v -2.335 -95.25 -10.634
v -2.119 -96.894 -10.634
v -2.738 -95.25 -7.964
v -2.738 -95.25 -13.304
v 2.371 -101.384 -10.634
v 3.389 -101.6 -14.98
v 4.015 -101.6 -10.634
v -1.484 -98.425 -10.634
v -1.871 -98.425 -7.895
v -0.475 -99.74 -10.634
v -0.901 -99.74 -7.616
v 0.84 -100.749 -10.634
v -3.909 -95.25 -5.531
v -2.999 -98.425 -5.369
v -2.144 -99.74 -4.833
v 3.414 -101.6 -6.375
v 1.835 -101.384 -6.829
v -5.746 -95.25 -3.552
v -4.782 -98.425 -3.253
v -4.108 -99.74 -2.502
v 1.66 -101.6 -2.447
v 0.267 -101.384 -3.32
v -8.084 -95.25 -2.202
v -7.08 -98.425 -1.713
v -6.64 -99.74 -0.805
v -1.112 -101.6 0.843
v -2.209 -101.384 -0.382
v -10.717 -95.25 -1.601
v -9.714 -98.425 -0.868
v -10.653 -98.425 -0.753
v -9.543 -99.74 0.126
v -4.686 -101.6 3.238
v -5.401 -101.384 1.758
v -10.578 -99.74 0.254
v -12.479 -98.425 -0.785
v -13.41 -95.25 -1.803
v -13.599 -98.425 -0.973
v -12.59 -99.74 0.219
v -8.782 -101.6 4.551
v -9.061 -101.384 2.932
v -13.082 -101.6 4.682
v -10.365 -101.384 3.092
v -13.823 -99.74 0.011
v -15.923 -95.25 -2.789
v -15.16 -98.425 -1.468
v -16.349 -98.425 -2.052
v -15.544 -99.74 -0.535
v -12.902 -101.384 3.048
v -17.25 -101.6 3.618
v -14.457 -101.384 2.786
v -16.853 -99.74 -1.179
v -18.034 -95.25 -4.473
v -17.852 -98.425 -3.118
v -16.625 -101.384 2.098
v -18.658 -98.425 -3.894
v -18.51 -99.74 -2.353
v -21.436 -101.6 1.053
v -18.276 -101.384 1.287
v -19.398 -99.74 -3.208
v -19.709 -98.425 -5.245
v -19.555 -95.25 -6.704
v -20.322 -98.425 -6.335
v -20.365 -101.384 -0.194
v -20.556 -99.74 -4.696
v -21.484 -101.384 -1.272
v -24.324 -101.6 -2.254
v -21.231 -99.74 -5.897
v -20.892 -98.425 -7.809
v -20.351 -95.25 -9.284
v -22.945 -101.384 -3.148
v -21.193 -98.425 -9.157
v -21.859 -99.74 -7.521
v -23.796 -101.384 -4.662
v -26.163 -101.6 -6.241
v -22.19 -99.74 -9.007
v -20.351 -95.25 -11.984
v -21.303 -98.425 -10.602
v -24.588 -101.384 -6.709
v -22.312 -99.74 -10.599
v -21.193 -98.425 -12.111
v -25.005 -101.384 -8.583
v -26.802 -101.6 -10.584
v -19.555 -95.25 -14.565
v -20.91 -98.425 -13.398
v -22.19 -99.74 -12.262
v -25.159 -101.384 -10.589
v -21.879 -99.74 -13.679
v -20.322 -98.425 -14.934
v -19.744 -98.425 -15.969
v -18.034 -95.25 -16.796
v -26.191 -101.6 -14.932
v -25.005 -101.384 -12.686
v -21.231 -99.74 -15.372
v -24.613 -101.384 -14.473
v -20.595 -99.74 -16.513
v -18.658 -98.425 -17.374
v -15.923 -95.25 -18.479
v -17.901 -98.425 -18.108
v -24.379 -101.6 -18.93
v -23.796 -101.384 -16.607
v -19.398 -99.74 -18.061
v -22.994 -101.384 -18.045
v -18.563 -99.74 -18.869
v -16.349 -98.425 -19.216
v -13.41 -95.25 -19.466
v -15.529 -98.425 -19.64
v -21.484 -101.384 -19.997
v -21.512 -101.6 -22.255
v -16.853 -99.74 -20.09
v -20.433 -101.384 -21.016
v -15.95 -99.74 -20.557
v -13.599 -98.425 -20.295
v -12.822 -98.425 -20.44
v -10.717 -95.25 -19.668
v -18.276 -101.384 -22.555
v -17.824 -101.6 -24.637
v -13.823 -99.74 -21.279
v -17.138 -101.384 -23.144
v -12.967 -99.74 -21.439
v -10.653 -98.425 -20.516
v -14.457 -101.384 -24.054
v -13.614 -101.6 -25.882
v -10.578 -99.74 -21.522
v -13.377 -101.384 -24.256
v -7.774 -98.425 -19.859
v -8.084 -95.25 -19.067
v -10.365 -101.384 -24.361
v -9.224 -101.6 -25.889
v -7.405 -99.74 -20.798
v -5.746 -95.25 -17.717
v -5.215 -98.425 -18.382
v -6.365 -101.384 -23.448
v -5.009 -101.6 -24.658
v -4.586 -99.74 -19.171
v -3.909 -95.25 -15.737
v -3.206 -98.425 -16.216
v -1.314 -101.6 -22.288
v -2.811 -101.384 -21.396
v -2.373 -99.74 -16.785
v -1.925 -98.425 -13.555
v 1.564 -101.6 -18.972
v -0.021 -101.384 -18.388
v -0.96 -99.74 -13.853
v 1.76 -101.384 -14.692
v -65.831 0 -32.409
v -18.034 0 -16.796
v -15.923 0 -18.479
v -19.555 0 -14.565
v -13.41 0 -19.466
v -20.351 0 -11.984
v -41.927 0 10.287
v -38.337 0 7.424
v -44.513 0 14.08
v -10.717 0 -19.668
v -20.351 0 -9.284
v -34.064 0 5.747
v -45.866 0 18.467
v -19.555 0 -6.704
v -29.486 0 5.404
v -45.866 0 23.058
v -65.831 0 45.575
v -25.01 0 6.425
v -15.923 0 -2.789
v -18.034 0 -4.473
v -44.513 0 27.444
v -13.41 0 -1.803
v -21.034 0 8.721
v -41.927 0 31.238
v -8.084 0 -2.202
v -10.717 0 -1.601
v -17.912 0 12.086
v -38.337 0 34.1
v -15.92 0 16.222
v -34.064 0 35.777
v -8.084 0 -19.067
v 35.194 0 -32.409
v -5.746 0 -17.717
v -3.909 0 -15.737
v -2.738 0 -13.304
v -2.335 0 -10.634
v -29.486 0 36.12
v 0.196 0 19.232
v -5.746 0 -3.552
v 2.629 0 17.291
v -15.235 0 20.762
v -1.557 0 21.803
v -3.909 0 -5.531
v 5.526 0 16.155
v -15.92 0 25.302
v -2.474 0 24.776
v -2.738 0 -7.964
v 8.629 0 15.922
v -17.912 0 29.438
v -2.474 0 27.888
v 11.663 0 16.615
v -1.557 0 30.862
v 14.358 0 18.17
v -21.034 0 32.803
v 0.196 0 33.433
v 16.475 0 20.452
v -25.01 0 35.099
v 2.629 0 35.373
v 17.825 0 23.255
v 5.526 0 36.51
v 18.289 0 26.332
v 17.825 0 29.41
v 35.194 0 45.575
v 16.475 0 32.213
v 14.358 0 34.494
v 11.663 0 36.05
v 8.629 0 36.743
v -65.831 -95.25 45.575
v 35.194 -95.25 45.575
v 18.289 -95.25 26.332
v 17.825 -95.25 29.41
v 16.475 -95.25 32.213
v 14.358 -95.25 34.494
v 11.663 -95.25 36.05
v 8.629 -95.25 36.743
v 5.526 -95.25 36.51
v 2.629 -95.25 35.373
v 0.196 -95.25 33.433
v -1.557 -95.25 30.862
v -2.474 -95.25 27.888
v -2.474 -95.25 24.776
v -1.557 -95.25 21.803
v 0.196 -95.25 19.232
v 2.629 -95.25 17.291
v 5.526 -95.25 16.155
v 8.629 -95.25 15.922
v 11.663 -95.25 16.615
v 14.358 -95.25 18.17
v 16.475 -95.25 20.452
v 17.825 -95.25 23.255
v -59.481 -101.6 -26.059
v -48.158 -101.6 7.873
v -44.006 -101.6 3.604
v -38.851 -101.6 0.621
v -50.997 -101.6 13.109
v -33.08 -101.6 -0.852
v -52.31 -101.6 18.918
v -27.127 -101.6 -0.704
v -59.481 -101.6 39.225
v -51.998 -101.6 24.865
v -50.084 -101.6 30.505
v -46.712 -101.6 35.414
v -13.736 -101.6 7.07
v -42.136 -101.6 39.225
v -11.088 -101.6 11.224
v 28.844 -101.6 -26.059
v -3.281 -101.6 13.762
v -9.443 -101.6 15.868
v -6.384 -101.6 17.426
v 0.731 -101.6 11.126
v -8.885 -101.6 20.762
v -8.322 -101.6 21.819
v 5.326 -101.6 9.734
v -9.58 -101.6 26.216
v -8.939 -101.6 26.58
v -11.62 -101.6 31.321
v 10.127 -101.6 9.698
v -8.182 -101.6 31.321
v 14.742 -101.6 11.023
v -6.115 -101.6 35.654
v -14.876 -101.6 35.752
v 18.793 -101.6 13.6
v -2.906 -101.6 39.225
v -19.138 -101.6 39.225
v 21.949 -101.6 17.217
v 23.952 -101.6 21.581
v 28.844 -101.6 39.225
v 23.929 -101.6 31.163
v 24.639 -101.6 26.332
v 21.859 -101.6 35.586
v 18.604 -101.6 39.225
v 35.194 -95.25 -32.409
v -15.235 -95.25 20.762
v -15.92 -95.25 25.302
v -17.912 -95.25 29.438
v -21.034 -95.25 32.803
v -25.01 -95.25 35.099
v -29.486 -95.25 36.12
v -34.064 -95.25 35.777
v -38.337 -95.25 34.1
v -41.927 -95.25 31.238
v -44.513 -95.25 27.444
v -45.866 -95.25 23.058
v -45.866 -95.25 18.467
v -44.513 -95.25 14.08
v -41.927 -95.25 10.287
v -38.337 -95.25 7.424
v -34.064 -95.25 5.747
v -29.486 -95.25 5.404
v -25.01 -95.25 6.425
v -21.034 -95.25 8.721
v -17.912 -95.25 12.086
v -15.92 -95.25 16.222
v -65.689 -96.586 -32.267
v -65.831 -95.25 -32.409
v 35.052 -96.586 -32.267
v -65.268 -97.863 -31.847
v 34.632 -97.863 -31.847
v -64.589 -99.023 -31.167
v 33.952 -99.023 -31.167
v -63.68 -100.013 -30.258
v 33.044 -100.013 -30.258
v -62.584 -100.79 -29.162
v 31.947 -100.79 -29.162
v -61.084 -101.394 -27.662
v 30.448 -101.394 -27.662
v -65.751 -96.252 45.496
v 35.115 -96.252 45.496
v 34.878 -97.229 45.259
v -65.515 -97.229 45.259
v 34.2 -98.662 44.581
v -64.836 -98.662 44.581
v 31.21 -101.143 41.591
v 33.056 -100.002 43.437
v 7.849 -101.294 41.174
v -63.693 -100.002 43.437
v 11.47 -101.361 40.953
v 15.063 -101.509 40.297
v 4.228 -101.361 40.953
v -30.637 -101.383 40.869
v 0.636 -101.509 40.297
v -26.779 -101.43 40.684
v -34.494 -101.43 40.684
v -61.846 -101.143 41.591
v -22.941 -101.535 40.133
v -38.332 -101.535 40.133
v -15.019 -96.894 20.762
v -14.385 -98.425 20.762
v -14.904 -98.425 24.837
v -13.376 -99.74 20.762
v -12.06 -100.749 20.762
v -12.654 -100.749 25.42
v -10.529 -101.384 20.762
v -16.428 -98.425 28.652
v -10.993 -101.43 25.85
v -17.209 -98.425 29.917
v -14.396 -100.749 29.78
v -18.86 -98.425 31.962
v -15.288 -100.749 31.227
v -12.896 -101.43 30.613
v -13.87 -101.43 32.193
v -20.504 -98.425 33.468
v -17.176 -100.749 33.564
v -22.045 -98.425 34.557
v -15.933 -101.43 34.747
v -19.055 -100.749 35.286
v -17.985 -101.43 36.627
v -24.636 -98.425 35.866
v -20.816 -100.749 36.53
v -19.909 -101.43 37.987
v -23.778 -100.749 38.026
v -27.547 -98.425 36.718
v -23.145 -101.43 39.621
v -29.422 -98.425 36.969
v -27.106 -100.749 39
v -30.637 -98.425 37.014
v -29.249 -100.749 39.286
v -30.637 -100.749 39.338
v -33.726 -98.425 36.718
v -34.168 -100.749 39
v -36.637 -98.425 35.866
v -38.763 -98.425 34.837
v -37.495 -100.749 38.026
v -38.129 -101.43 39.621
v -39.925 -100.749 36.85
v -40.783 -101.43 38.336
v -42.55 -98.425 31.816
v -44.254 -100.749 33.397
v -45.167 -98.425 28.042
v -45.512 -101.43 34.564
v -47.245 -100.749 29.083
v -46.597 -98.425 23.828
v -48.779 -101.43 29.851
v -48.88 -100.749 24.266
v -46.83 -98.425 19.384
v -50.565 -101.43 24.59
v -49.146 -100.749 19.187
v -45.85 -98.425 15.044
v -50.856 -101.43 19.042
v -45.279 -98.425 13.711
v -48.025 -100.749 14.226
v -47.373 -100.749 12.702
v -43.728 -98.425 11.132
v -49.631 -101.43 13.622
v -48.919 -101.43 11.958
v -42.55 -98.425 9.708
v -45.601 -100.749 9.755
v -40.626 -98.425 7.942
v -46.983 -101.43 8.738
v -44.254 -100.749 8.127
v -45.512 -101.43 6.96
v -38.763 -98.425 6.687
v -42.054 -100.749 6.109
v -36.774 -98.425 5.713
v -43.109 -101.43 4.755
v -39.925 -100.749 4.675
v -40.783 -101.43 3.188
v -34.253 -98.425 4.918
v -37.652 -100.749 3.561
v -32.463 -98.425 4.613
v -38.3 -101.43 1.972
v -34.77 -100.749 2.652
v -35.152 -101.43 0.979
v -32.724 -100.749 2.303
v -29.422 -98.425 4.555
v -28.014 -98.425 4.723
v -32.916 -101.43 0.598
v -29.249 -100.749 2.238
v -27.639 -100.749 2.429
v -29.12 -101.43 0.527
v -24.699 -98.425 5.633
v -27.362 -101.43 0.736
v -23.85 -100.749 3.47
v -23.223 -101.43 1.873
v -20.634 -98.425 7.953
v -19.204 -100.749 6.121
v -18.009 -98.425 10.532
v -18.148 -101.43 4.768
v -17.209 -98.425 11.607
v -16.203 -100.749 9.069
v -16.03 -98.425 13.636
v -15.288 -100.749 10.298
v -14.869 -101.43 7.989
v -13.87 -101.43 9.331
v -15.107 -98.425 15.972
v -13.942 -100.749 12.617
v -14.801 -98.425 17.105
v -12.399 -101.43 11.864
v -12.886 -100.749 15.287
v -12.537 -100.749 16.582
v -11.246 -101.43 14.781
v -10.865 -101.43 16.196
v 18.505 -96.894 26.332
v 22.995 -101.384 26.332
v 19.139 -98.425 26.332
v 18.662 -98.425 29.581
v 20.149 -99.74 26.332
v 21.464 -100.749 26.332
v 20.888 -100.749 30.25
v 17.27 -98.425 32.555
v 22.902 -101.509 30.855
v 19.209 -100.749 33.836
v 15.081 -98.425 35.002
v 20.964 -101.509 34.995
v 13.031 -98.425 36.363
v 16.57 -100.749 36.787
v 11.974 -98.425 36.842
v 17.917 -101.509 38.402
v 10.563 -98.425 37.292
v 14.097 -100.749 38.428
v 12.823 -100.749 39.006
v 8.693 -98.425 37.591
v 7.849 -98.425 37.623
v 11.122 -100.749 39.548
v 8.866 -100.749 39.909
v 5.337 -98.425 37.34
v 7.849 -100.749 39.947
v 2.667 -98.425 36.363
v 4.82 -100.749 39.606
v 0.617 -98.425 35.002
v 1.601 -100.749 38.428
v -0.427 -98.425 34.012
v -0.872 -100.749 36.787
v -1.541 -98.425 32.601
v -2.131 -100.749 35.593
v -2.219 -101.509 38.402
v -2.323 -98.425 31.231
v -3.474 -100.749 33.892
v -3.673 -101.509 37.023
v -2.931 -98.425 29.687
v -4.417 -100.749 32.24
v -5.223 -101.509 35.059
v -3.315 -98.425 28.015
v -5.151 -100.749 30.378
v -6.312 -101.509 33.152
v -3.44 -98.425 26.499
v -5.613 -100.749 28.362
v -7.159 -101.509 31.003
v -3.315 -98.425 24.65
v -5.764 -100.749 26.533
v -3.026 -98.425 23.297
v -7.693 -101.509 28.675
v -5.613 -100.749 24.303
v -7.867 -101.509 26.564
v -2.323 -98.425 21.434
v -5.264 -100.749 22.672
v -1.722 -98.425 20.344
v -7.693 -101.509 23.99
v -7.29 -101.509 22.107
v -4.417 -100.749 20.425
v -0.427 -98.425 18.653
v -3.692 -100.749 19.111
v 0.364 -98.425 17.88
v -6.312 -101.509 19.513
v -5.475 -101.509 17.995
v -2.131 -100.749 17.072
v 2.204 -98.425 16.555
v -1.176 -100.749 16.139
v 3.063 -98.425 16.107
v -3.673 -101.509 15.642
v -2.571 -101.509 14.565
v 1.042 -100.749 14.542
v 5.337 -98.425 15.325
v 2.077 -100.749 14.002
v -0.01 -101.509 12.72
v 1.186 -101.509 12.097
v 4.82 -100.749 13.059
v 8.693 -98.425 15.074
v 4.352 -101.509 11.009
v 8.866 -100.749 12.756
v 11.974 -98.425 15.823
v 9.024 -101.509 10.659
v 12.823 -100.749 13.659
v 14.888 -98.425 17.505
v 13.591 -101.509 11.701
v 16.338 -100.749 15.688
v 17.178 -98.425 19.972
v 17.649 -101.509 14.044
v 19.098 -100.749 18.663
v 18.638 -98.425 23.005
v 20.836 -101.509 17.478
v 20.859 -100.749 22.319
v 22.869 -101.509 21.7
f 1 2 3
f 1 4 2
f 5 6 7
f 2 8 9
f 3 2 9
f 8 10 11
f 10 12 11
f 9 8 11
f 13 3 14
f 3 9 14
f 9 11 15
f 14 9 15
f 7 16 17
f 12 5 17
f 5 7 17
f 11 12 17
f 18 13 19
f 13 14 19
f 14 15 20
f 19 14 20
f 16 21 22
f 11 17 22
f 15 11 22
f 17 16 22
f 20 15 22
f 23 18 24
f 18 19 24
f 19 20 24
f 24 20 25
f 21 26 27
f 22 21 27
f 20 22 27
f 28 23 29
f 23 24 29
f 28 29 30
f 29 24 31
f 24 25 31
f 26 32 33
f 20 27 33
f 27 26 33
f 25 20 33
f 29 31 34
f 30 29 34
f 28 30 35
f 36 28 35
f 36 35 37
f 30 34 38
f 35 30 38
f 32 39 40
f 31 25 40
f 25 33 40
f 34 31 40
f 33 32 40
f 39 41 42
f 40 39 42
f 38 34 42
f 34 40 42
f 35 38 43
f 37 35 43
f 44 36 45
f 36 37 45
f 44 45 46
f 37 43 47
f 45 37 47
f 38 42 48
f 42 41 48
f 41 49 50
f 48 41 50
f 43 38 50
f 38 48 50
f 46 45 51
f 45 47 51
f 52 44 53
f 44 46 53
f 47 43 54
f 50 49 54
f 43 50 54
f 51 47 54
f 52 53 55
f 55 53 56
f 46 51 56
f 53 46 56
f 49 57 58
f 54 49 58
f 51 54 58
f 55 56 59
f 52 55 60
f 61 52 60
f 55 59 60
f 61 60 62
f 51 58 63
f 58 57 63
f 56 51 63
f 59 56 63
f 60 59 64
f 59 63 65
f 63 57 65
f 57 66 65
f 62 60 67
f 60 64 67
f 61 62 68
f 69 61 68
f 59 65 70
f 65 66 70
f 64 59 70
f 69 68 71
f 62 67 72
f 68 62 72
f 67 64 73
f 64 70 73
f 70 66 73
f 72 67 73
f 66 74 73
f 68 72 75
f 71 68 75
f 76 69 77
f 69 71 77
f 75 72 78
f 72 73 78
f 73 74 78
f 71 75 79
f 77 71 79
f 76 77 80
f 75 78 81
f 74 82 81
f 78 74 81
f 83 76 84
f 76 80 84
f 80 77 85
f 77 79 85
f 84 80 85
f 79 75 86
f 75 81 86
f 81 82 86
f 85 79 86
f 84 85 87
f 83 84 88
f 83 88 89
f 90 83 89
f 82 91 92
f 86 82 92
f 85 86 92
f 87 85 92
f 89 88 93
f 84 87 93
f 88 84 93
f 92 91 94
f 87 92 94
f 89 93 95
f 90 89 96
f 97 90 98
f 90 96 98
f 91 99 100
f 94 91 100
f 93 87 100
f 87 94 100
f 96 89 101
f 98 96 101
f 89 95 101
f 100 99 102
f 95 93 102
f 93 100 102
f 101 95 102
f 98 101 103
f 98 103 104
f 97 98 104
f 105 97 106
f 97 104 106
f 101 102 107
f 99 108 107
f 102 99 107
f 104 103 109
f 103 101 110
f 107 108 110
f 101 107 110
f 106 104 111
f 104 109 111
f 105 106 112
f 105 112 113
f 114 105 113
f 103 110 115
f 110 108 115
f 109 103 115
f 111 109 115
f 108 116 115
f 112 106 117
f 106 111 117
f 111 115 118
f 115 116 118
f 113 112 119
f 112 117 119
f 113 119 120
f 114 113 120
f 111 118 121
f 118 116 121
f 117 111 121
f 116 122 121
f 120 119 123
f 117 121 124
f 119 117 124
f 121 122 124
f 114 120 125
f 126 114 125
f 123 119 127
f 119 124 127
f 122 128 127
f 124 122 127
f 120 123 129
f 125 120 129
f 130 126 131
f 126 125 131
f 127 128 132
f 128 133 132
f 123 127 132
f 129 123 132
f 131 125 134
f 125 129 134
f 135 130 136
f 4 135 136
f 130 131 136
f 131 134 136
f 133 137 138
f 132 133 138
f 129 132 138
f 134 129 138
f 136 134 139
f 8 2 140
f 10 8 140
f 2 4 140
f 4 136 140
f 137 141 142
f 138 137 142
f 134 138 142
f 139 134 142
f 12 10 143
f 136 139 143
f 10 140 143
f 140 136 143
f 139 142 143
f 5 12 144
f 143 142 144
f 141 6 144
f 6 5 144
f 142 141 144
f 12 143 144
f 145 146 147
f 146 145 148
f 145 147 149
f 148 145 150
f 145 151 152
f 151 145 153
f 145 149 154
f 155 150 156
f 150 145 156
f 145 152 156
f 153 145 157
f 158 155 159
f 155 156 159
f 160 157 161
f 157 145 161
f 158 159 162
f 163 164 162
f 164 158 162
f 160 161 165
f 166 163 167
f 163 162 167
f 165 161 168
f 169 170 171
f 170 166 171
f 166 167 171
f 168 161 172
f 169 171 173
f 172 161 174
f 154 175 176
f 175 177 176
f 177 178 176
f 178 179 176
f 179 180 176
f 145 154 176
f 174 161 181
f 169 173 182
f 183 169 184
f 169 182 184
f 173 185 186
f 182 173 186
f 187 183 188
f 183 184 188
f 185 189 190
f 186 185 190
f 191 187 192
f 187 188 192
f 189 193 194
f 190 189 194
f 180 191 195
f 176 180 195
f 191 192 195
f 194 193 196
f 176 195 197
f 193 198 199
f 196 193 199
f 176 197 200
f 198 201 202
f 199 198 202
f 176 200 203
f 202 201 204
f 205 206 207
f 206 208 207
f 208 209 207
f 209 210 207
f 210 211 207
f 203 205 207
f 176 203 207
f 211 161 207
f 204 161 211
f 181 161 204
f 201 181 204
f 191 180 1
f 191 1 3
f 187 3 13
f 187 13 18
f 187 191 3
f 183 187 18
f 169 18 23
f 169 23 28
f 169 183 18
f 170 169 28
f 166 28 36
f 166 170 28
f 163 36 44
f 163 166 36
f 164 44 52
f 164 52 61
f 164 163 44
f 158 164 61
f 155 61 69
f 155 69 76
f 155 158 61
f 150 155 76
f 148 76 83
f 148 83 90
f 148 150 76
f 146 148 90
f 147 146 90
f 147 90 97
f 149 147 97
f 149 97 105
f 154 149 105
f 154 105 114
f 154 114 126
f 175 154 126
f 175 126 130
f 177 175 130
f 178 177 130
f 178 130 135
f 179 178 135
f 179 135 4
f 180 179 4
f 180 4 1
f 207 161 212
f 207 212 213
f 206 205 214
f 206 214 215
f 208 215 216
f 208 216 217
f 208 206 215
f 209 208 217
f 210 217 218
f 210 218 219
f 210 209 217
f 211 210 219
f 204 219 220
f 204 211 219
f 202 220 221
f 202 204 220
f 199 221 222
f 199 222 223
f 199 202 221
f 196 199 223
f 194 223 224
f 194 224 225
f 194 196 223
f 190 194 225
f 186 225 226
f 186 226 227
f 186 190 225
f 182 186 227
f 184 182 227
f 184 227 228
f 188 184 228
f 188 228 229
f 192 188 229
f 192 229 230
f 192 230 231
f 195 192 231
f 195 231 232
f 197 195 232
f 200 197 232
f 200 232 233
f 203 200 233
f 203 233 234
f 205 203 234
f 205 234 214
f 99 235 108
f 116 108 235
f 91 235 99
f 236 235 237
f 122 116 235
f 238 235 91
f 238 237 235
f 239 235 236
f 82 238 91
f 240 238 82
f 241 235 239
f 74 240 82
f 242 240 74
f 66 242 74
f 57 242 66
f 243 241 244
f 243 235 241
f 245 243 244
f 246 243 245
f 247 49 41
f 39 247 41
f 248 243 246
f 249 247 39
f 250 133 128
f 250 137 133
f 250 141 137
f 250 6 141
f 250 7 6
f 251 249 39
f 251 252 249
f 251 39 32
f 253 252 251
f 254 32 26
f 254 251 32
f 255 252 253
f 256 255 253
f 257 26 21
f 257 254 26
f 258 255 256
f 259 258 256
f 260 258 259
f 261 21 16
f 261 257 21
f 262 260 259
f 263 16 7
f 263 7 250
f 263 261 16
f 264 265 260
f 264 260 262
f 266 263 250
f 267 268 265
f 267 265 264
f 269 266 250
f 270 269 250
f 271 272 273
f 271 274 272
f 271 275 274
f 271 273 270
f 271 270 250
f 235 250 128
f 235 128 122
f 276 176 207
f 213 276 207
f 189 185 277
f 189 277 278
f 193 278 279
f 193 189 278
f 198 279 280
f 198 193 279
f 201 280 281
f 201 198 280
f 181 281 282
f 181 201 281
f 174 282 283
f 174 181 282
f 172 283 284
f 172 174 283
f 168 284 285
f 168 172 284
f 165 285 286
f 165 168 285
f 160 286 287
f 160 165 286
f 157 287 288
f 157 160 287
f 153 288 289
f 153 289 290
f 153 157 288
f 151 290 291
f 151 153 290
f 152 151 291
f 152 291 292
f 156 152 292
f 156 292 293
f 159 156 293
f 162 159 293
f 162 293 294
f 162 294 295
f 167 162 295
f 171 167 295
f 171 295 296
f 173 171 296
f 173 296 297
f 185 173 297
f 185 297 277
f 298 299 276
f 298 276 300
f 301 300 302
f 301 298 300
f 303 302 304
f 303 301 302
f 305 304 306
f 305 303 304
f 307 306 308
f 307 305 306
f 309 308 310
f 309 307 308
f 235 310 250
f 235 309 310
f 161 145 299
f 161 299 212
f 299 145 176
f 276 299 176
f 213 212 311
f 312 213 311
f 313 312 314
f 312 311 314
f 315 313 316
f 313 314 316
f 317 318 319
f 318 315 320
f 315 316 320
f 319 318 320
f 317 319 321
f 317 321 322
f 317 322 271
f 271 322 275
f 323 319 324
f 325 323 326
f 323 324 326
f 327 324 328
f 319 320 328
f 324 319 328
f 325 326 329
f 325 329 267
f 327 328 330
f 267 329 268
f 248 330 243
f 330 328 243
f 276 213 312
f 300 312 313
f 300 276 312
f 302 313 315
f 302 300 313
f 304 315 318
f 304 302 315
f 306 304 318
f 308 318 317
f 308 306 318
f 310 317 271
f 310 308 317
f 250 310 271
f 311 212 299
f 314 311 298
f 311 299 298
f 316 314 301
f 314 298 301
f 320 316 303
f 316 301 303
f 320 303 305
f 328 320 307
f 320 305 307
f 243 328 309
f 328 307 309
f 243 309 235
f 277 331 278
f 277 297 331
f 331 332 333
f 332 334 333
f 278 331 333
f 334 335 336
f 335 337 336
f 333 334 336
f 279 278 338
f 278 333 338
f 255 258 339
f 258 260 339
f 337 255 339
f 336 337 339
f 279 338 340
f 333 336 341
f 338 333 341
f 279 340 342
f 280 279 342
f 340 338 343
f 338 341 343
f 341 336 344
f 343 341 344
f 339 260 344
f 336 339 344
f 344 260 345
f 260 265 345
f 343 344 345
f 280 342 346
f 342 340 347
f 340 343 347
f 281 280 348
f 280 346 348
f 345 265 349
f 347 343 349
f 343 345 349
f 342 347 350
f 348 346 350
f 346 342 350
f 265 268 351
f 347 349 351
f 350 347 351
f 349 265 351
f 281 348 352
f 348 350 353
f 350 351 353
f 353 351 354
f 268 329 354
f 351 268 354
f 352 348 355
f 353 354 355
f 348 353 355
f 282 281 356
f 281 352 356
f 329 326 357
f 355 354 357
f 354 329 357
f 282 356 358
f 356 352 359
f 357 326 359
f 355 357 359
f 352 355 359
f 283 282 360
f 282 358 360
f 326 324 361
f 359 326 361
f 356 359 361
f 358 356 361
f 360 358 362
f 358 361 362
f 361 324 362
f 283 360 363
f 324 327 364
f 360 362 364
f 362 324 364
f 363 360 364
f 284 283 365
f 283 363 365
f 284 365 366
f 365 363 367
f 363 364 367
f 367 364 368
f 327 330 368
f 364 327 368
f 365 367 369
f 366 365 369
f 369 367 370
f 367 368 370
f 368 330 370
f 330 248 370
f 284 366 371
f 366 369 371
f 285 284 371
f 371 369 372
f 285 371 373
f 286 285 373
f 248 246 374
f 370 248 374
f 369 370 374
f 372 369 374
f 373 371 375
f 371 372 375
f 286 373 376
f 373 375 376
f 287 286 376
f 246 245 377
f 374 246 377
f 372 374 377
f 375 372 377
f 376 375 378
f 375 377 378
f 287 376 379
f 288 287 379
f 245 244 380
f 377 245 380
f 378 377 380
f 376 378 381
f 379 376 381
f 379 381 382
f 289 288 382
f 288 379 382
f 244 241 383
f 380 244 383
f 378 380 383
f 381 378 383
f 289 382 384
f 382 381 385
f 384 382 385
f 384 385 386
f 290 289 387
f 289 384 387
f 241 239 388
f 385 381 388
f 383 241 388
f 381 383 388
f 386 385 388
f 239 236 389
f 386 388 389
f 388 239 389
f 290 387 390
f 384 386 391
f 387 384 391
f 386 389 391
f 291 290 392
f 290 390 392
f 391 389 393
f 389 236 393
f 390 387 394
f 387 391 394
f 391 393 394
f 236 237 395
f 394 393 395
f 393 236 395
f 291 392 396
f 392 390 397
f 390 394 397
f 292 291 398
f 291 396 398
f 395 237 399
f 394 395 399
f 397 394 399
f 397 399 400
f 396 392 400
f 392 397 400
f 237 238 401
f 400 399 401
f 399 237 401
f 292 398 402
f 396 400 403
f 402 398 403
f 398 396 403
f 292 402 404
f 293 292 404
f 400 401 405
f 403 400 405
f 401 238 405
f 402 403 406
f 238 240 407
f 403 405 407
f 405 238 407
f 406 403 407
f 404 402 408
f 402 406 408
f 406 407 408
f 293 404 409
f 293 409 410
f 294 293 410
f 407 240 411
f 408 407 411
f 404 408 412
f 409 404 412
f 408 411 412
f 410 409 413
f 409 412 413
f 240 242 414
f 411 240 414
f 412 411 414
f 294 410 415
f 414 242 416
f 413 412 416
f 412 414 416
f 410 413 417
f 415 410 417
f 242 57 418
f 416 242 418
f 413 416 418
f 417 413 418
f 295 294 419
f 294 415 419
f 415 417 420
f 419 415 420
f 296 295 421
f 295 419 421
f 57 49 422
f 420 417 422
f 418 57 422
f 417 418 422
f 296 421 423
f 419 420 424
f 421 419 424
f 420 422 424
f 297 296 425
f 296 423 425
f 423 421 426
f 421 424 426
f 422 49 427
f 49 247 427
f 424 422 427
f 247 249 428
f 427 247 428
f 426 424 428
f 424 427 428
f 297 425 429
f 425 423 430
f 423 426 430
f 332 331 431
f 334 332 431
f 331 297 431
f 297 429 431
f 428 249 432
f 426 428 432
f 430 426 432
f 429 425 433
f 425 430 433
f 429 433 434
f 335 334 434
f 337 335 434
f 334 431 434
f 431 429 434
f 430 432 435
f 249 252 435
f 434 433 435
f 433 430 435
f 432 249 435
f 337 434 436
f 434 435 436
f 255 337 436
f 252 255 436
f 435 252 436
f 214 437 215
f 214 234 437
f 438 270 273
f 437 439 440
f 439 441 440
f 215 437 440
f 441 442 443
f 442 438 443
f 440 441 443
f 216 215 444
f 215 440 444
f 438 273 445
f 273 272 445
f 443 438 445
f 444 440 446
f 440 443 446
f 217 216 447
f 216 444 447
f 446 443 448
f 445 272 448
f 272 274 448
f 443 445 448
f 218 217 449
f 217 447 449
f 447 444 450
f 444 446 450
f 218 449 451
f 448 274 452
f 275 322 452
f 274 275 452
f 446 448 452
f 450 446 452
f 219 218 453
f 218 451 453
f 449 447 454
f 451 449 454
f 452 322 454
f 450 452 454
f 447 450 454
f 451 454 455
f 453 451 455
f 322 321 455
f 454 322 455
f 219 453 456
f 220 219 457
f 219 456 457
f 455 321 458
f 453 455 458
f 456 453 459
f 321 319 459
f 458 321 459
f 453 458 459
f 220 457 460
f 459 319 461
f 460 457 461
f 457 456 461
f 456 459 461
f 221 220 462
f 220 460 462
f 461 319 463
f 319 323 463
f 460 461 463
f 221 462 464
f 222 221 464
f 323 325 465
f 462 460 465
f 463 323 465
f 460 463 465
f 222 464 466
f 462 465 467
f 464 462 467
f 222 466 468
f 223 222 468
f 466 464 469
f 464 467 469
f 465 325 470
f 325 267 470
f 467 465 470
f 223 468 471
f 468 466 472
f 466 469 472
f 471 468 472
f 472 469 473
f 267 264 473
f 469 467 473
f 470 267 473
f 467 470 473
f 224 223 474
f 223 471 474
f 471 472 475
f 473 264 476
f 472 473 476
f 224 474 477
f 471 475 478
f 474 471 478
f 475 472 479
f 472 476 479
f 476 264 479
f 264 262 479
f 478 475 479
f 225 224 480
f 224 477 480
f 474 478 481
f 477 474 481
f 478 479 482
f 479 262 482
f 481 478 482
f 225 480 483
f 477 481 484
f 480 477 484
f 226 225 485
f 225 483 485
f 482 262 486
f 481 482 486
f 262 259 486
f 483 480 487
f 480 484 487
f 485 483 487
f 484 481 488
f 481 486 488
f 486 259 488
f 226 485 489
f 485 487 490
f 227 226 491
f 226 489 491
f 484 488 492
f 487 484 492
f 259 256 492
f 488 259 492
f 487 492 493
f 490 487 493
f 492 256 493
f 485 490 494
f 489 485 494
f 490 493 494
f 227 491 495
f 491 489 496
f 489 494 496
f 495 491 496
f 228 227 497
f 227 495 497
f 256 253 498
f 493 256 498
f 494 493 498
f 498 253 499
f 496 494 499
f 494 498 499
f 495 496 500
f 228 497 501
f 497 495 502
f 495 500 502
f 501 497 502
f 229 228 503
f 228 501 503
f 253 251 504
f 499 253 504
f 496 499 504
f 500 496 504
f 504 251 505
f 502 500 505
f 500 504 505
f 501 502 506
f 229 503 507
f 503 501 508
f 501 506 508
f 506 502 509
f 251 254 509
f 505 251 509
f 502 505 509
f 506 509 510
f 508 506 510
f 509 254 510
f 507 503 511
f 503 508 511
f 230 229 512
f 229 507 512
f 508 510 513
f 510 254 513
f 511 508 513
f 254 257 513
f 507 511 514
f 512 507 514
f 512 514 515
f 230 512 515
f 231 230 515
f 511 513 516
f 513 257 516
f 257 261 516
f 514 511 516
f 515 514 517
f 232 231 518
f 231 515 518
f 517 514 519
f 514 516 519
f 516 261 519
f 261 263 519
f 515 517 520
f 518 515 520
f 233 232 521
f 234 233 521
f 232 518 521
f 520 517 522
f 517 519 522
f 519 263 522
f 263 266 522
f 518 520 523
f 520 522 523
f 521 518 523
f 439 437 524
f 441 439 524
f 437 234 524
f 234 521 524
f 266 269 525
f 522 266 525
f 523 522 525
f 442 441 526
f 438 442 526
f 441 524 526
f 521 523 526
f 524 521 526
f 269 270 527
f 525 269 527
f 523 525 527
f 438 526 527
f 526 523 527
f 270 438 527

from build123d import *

# Parameters (mm, degrees)
F0_W        = 101.0252870619
F0_H        = 77.9844336212
F0_R        = 9.0586238997
F0_R_2      = 15.4013236799
F0_R_3      = 10.4395473454
F1_DEPTH    = 101.6
F2_T1_DEPTH = 132.7752870619
F2_T3_DEPTH = 109.7344336212


# Not quite as in the source:
# - a fillet or chamfer that OpenCascade refuses, or shapes differently, is made with other operations: its cross-section is extruded or revolved along the edge and cut away or added
# - a feature of the source that left no trace in its solid (it failed there, or was rolled back) is left out


with BuildPart() as f1:
    # F0 (on Front) → F1 (new body)
    with BuildSketch(Plane.XZ):
        with Locations((-15.3183694929, 6.5831001848)):
            Rectangle(F0_W, F0_H)
        with Locations((-11.3938301802, -10.6342416257)):
            Circle(F0_R, mode=Mode.SUBTRACT)
        with Locations((-30.6367408484, 20.7620896399)):
            Circle(F0_R_2, mode=Mode.SUBTRACT)
        with Locations((7.8490832821, 26.3324063271)):
            Circle(F0_R_3, mode=Mode.SUBTRACT)
    extrude(amount=F1_DEPTH)

    # F2: fillet of radius 6.35 on 7 edges, made by hand

    # F2_s2 → F2_t1 (cut)
    with BuildSketch(Plane.YZ.offset(-81.7060130239)):
        with BuildLine():
            ThreePointArc((-95.25, 45.5753169954), (-99.7401280605, 43.7154450559), (-101.6, 39.2253169954))
            Line((-101.6, 39.2253169954), (-101.6, 45.5753169954))
            Line((-101.6, 45.5753169954), (-95.25, 45.5753169954))
        make_face()
        with BuildLine():
            ThreePointArc((-95.25, -32.4091166258), (-99.7401280605, -30.5492446863), (-101.6, -26.0591166258))
            Line((-101.6, -26.0591166258), (-101.6, -32.4091166258))
            Line((-101.6, -32.4091166258), (-95.25, -32.4091166258))
        make_face()
    extrude(amount=F2_T1_DEPTH, mode=Mode.SUBTRACT)

    # F2_s4 → F2_t3 (cut)
    with BuildSketch(Plane.XY.offset(-48.2841166258)):
        with BuildLine():
            ThreePointArc((-65.8310130239, -95.25), (-63.9711410844, -99.7401280605), (-59.4810130239, -101.6))
            Line((-59.4810130239, -101.6), (-65.8310130239, -101.6))
            Line((-65.8310130239, -101.6), (-65.8310130239, -95.25))
        make_face()
        with BuildLine():
            ThreePointArc((35.1942740381, -95.25), (33.3344020986, -99.7401280605), (28.8442740381, -101.6))
            Line((28.8442740381, -101.6), (35.1942740381, -101.6))
            Line((35.1942740381, -101.6), (35.1942740381, -95.25))
        make_face()
    extrude(amount=F2_T3_DEPTH, mode=Mode.SUBTRACT)

    # F2_s5 → F2_t6 (revolve, cut)
    with BuildSketch(Plane.XY.offset(-10.6342416257)):
        with BuildLine():
            ThreePointArc((-2.3352062804, -95.25), (-0.475334341, -99.7401280605), (4.0147937196, -101.6))
            Line((4.0147937196, -101.6), (-2.3352062804, -101.6))
            Line((-2.3352062804, -101.6), (-2.3352062804, -95.25))
        make_face()
    revolve(axis=Axis((-11.3938301802, -101.6, -10.6342416257), (0, -1, 0)), mode=Mode.SUBTRACT)

    # F2_s7 → F2_t8 (revolve, cut)
    with BuildSketch(Plane.XY.offset(20.7620896399)):
        with BuildLine():
            ThreePointArc((-15.2354171685, -95.25), (-13.375545229, -99.7401280605), (-8.8854171685, -101.6))
            Line((-8.8854171685, -101.6), (-15.2354171685, -101.6))
            Line((-15.2354171685, -101.6), (-15.2354171685, -95.25))
        make_face()
    revolve(axis=Axis((-30.6367408484, -101.6, 20.7620896399), (0, -1, 0)), mode=Mode.SUBTRACT)

    # F2_s9 → F2_t10 (revolve, cut)
    with BuildSketch(Plane.XY.offset(26.3324063271)):
        with BuildLine():
            ThreePointArc((18.2886306275, -95.25), (20.1485025669, -99.7401280605), (24.6386306275, -101.6))
            Line((24.6386306275, -101.6), (18.2886306275, -101.6))
            Line((18.2886306275, -101.6), (18.2886306275, -95.25))
        make_face()
    revolve(axis=Axis((7.8490832821, -101.6, 26.3324063271), (0, -1, 0)), mode=Mode.SUBTRACT)


solid = f1.part
